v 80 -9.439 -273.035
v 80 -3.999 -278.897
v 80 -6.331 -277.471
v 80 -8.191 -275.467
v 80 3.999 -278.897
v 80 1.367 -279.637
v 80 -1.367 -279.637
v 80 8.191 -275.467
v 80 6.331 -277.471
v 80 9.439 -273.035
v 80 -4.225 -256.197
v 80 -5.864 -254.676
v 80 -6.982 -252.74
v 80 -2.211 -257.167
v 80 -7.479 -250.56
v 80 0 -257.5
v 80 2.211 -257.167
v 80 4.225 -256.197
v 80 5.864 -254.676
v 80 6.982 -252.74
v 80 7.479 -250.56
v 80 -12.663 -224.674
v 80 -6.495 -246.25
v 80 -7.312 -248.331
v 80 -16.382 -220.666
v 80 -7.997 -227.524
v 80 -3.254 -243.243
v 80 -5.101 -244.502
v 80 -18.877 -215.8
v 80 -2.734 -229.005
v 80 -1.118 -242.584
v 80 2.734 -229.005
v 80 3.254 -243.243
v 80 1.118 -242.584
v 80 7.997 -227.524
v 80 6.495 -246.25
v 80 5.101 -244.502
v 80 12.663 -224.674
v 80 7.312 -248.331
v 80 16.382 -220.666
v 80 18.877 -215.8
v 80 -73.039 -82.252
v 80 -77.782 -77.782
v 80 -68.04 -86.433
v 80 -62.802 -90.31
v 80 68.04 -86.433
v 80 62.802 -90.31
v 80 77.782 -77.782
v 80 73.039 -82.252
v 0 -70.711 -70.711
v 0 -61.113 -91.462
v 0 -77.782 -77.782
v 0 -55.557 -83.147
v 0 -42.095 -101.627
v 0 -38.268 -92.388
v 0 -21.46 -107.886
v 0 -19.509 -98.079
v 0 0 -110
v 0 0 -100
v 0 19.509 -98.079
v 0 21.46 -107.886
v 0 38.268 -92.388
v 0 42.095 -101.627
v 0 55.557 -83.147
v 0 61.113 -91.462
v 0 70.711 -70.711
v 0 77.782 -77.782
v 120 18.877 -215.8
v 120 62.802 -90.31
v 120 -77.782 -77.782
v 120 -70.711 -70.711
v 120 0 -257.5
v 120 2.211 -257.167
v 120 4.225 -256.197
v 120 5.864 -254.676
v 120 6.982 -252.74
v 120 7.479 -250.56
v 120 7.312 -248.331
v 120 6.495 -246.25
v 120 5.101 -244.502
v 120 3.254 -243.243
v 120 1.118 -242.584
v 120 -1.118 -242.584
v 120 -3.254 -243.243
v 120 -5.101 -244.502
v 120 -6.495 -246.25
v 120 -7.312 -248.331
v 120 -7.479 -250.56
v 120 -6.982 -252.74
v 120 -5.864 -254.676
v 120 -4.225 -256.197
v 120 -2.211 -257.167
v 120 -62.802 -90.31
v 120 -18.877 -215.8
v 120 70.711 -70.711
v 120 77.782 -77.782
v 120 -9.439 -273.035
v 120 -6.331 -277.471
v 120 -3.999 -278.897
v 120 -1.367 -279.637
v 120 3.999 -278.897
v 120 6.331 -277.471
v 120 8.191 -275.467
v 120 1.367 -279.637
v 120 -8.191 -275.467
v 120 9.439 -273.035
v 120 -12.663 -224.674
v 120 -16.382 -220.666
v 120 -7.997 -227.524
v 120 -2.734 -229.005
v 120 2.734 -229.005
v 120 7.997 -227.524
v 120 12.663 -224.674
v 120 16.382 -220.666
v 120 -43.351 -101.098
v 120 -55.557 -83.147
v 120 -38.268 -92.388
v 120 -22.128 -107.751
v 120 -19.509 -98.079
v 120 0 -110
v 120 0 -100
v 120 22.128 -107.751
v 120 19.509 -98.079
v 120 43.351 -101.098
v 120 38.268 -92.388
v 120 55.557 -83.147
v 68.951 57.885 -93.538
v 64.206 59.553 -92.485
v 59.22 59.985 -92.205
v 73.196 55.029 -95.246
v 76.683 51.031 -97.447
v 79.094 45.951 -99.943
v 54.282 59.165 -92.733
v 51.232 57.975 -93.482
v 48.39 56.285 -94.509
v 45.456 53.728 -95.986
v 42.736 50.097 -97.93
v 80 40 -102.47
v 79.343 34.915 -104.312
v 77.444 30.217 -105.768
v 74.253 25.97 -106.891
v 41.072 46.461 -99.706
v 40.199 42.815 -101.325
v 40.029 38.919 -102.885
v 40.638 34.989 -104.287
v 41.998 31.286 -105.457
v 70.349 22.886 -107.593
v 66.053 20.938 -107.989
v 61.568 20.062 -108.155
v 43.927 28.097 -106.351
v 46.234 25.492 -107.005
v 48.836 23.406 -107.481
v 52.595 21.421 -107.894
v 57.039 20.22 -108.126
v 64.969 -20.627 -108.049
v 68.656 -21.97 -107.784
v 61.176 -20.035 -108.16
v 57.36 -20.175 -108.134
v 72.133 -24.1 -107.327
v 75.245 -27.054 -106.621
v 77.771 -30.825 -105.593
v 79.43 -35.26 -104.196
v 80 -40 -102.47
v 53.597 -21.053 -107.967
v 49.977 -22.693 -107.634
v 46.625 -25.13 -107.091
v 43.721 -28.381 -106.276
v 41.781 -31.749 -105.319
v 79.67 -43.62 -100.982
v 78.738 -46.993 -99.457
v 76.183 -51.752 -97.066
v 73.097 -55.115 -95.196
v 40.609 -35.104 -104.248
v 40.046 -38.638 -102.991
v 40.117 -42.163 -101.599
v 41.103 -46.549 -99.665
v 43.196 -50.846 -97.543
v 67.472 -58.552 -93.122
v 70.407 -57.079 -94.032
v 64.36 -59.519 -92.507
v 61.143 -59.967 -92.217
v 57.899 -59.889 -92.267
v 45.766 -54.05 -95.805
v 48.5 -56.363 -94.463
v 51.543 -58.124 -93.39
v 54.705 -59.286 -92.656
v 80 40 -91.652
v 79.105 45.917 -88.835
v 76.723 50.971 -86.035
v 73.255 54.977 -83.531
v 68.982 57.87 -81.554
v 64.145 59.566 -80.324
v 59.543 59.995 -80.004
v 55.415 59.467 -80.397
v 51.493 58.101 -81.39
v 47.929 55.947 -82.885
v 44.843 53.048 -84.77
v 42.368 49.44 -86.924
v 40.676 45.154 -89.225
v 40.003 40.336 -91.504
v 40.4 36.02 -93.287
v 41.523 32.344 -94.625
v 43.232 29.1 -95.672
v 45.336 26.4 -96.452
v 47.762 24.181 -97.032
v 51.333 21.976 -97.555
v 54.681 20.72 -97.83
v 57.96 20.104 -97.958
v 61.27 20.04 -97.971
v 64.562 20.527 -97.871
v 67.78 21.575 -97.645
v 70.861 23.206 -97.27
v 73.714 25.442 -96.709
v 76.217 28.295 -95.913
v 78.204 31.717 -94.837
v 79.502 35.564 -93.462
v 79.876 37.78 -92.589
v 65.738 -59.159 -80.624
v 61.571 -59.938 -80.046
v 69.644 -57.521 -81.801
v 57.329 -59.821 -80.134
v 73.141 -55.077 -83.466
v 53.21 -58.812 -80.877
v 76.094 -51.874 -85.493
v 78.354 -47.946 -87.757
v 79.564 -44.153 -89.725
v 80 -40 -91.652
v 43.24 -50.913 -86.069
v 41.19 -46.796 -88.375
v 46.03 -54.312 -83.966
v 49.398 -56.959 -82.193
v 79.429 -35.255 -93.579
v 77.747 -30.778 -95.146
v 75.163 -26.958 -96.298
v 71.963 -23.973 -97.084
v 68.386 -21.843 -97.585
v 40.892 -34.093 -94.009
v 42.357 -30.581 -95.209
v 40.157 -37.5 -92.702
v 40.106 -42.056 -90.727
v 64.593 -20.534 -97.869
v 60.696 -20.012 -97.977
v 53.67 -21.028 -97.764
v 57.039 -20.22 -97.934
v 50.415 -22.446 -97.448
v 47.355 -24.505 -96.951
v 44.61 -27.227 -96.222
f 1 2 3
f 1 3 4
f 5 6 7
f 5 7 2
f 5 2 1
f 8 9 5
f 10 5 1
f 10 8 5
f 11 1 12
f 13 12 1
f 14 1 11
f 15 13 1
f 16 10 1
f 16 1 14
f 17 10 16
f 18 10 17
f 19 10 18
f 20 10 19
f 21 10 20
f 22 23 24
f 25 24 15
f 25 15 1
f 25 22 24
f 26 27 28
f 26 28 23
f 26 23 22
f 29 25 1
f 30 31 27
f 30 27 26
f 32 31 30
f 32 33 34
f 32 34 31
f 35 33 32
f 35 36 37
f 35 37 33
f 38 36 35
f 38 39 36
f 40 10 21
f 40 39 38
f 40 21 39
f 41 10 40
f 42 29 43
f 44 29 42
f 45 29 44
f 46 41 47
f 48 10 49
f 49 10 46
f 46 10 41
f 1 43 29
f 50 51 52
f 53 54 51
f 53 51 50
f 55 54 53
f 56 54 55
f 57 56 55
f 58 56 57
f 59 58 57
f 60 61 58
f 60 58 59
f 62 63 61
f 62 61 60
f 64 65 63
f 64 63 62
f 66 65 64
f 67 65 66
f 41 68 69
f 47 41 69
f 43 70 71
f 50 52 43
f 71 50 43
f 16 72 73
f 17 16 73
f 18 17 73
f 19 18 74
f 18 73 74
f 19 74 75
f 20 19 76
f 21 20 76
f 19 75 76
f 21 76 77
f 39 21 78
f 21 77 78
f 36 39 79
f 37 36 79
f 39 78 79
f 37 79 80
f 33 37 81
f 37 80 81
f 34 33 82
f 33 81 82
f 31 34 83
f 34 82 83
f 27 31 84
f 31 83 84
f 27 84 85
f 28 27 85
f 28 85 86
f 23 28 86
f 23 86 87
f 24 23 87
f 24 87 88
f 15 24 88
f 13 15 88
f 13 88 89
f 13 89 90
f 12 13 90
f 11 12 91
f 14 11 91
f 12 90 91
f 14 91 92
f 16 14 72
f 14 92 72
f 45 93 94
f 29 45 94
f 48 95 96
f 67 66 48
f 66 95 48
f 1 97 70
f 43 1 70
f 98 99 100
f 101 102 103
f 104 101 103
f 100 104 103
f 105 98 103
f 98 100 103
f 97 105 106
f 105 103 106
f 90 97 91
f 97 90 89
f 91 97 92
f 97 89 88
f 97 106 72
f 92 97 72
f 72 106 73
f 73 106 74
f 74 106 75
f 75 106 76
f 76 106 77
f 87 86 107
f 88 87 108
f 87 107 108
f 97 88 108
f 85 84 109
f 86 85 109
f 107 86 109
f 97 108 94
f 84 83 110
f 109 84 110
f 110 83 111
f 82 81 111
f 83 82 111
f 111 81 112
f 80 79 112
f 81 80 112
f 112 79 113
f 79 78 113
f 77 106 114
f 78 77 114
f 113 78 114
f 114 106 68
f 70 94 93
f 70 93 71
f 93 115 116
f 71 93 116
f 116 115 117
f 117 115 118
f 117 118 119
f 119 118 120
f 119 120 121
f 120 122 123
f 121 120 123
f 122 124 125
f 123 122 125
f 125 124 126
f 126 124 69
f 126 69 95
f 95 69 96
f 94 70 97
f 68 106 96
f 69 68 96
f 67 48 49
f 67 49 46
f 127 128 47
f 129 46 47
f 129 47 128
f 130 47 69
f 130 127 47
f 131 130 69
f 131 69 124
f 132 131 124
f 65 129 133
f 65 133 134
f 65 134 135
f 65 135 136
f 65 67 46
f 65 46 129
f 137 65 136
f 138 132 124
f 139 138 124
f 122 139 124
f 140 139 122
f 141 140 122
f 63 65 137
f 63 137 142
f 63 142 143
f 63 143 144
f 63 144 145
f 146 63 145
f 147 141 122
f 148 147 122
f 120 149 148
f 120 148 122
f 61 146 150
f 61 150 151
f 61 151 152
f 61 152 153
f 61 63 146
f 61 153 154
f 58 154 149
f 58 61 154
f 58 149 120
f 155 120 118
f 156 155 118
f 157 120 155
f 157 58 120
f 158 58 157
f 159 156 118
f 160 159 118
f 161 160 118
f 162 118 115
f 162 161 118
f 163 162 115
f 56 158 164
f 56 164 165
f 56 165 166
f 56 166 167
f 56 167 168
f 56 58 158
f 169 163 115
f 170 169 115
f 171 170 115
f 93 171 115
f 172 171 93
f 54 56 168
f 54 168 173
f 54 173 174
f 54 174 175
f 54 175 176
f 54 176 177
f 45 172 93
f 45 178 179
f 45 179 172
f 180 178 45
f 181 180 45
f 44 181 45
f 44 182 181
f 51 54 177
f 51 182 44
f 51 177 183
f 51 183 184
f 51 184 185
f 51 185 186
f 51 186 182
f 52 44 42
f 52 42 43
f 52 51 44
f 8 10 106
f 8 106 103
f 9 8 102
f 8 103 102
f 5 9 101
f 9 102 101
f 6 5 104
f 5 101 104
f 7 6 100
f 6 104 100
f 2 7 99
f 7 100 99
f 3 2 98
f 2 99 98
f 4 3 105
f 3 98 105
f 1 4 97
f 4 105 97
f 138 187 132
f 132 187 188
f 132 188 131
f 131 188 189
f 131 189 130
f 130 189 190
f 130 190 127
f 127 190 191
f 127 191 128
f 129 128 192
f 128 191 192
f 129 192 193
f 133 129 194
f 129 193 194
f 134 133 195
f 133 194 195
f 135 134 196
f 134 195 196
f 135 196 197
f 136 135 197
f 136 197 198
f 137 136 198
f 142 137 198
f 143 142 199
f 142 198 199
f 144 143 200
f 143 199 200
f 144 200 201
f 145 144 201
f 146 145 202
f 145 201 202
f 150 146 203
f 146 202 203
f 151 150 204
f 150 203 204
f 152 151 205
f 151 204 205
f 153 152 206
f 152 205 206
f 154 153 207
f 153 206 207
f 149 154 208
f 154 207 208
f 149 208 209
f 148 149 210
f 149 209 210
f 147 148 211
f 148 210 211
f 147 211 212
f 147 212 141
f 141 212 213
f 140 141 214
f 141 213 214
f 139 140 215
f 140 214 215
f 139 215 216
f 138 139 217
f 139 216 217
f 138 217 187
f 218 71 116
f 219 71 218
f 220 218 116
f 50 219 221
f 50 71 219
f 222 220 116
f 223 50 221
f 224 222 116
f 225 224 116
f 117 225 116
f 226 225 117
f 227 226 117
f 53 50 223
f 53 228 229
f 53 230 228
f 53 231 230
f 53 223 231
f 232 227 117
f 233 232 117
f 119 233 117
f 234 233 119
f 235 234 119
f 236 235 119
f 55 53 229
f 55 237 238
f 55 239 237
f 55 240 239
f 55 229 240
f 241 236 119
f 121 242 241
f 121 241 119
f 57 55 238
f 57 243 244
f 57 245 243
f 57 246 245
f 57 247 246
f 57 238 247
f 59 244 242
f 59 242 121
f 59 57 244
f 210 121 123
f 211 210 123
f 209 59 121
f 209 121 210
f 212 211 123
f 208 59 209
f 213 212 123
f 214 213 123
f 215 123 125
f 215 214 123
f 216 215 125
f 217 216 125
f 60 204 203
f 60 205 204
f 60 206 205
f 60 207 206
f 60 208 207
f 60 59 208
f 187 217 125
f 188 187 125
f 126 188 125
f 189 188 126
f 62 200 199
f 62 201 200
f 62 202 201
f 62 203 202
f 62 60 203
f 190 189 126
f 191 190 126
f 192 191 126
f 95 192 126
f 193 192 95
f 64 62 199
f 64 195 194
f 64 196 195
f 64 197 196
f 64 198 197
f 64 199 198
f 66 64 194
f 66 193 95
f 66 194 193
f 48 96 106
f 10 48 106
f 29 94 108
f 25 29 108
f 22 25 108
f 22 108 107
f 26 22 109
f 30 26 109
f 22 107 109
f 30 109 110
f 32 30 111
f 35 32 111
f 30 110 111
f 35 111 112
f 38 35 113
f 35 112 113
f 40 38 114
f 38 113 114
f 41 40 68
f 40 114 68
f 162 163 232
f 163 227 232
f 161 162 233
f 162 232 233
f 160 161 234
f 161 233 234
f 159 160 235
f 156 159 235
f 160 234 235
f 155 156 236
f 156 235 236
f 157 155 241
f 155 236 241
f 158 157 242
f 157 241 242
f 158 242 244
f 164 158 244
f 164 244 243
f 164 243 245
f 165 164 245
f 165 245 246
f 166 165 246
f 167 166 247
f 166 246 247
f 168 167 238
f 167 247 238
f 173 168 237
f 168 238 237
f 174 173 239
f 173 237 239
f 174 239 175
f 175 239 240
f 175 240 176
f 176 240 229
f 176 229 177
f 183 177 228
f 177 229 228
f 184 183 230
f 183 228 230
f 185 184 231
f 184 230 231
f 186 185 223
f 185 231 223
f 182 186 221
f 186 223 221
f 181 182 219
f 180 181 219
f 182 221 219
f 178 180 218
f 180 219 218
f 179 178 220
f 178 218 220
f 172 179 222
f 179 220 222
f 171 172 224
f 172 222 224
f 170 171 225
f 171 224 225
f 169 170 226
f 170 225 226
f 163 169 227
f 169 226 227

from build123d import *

# Parameters (mm, degrees)
BOSS_EXTRUDE1_DEPTH = 120
BOSS_EXTRUDE2_DEPTH = 40
SKETCH4_R           = 7.5
CUT_EXTRUDE1_DEPTH  = 40
SKETCH6_R           = 20
CUT_EXTRUDE2_DEPTH  = 280.73097144


with BuildPart() as part:
    # Sketch1 → Boss-Extrude1 (new body)
    with BuildSketch(Plane(origin=(0, 0, 0), x_dir=(0, 0, -1), z_dir=(1, 0, 0))):
        with BuildLine():
            Line((70.710678119, 70.710678119), (77.781745931, 77.781745931))
            ThreePointArc((77.781745931, 77.781745931), (110, 0), (77.781745931, -77.781745931))
            Line((77.781745931, -77.781745931), (70.710678119, -70.710678119))
            ThreePointArc((70.710678119, -70.710678119), (100, 0), (70.710678119, 70.710678119))
        make_face()
    extrude(amount=BOSS_EXTRUDE1_DEPTH)

    # Sketch2 → Boss-Extrude2 (add)
    with BuildSketch(Plane(origin=(120, 0, 0), x_dir=(0, 0, -1), z_dir=(1, 0, 0))):
        with BuildLine():
            Line((77.781745931, 77.781745931), (273.03467839, 9.438512616))
            ThreePointArc((273.03467839, 9.438512616), (279.73097144, 0), (273.03467839, -9.438512616))
            Line((273.03467839, -9.438512616), (77.781745931, -77.781745931))
            Line((77.781745931, -77.781745931), (77.781745931, -67.18685624))
            Line((77.781745931, -67.18685624), (215.80032822, -18.877025231))
            ThreePointArc((215.80032822, -18.877025231), (229.192914321, 0), (215.80032822, 18.877025231))
            Line((215.80032822, 18.877025231), (77.781745931, 67.18685624))
            Line((77.781745931, 67.18685624), (77.781745931, 77.781745931))
        make_face()
    extrude(amount=-BOSS_EXTRUDE2_DEPTH)

    # Sketch4 → Cut-Extrude1 (cut)
    with BuildSketch(Plane(origin=(120, 0, 0), x_dir=(0, 0, -1), z_dir=(1, 0, 0))):
        with Locations((250, 0)):
            Circle(SKETCH4_R)
    extrude(amount=-CUT_EXTRUDE1_DEPTH, mode=Mode.SUBTRACT)

    # Sketch6 → Cut-Extrude2 (cut, through all)
    with BuildSketch(Plane.XY):
        with Locations((60, 40)):
            Circle(SKETCH6_R)
        with Locations((60, -40)):
            Circle(SKETCH6_R)
    extrude(amount=-CUT_EXTRUDE2_DEPTH, mode=Mode.SUBTRACT)


solid = part.part
